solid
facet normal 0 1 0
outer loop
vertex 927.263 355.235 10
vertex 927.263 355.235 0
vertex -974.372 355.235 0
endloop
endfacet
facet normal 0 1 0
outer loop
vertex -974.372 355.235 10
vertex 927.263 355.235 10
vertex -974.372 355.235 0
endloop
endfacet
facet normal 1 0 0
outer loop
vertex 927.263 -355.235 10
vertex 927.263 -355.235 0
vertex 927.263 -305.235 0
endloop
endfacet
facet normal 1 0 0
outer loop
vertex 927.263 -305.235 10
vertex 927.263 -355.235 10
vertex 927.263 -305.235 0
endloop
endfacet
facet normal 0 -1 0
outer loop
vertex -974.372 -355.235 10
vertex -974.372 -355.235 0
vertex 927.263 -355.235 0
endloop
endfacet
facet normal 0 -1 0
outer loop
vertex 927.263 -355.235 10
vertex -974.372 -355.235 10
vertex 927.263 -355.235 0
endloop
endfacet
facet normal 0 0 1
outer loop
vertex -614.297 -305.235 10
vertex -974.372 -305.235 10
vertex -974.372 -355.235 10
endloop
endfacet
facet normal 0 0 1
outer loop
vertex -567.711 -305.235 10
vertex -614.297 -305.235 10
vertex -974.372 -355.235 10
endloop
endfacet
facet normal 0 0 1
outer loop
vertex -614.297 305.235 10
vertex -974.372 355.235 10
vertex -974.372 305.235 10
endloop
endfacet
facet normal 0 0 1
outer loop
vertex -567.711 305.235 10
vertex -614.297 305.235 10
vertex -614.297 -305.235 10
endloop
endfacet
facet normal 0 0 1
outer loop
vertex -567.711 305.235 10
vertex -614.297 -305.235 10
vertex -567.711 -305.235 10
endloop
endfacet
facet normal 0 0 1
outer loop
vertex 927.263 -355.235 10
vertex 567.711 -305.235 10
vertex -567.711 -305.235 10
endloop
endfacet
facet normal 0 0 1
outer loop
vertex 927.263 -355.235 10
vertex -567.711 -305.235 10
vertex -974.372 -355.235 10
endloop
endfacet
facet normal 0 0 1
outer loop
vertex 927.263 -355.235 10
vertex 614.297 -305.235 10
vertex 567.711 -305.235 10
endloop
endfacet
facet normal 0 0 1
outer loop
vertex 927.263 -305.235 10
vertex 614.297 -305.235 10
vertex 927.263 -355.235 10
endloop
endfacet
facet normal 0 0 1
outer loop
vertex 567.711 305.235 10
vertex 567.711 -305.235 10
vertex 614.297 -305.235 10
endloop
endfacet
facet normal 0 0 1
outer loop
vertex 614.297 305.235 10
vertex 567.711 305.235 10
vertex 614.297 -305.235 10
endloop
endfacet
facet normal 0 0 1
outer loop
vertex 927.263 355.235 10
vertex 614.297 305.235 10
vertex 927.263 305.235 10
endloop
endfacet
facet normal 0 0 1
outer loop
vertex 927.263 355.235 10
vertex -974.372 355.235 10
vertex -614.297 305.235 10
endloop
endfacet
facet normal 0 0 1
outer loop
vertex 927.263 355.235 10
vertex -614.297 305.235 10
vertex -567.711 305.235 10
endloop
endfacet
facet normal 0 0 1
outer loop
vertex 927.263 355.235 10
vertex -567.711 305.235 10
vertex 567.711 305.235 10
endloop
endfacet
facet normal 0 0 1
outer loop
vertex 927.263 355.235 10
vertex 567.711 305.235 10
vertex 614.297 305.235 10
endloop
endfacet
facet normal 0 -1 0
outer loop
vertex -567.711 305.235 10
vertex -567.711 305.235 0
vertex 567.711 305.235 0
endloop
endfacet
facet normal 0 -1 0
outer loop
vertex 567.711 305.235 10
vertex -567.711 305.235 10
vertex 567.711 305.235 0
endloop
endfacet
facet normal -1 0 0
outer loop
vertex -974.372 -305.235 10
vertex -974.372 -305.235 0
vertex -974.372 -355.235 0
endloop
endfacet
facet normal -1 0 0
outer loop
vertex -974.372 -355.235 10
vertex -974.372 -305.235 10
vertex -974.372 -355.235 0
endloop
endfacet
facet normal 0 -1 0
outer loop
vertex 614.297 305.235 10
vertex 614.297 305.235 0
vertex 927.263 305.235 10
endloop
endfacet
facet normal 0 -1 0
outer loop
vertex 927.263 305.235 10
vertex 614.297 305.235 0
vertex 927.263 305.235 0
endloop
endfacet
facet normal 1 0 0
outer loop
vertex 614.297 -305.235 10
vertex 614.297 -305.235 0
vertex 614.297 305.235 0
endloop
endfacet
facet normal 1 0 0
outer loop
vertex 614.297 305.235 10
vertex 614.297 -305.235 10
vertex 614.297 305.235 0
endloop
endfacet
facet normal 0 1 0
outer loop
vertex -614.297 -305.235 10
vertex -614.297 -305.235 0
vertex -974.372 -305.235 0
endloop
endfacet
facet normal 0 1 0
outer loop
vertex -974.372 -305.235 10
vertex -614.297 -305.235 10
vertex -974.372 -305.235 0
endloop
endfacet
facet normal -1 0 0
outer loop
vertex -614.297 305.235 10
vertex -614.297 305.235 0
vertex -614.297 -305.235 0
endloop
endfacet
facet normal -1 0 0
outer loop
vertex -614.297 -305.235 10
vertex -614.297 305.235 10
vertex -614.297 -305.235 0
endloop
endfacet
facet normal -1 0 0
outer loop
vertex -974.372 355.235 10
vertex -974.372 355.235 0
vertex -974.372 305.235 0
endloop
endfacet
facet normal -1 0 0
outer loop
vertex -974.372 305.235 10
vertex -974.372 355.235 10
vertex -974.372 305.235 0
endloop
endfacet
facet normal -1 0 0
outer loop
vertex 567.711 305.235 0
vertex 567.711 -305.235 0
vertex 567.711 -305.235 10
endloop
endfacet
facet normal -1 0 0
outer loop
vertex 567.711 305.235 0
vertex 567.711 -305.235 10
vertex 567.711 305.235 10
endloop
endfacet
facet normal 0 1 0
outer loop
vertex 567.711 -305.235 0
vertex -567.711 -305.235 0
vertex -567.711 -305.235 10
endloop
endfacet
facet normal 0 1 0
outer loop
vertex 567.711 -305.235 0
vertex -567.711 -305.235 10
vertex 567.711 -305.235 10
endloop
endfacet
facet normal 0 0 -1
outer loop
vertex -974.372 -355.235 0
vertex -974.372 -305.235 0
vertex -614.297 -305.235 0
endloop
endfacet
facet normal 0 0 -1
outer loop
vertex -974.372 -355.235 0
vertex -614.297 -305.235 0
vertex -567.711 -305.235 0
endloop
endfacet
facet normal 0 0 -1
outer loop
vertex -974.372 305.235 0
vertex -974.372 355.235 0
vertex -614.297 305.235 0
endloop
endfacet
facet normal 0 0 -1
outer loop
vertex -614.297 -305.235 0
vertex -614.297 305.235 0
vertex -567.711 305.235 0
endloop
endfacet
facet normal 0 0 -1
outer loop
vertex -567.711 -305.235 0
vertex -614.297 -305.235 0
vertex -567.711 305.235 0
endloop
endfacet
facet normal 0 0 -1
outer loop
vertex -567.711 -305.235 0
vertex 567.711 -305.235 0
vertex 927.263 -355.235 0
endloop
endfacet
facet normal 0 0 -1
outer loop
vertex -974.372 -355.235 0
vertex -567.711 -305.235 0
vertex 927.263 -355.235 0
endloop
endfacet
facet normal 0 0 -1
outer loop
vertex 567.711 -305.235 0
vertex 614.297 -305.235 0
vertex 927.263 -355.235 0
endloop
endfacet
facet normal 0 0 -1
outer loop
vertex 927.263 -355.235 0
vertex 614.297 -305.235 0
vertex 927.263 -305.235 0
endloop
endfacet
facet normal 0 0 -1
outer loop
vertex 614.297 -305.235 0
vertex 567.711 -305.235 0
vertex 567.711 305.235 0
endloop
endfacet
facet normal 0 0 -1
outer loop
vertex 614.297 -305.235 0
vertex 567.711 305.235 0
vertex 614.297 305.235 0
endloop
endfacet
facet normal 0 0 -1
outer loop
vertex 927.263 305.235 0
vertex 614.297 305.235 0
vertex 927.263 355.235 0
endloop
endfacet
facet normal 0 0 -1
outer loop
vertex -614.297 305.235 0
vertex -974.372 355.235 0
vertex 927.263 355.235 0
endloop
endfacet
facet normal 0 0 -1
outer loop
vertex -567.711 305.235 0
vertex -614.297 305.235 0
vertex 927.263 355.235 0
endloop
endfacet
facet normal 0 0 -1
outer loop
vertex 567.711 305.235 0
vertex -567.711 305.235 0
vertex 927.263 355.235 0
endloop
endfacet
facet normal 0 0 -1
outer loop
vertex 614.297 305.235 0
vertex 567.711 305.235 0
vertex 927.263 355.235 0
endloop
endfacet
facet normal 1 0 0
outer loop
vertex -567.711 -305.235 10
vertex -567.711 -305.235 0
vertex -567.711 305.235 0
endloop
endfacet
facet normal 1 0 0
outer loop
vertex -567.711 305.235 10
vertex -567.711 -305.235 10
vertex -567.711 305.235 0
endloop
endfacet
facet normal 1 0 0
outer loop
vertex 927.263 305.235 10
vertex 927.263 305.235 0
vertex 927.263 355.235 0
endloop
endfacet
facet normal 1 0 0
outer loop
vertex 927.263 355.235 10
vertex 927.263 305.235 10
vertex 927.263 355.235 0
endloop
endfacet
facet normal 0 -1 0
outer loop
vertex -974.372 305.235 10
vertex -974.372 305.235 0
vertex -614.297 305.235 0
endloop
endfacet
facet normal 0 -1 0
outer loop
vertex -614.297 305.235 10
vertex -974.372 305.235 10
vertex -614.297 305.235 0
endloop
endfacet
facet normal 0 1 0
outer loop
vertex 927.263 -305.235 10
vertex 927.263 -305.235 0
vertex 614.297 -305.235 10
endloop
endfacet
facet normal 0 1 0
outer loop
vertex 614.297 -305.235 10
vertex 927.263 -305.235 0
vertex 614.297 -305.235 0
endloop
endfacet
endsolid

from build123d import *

# Parameters (mm, degrees)
F0_W     = 1135.422638
F0_H     = 610.469668
F1_DEPTH = 10


with BuildPart() as f1:
    # F0 (on Top) → F1 (new body)
    with BuildSketch(Plane.XY):
        Polygon((614.296978, 355.234834), (-614.296978, 355.234834), (-974.371552, 355.234834), (-974.371552, 305.234834), (-614.296978, 305.234834), (-614.296978, -305.234834), (-974.371552, -305.234834), (-974.371552, -355.234834), (-614.296978, -355.234834), (614.296978, -355.234834), (927.263439, -355.234834), (927.263439, -305.234834), (614.296978, -305.234834), (614.296978, 305.234834), (927.263439, 305.234834), (927.263439, 355.234834), align=None)
        Rectangle(F0_W, F0_H, mode=Mode.SUBTRACT)
    extrude(amount=F1_DEPTH)


solid = f1.part
